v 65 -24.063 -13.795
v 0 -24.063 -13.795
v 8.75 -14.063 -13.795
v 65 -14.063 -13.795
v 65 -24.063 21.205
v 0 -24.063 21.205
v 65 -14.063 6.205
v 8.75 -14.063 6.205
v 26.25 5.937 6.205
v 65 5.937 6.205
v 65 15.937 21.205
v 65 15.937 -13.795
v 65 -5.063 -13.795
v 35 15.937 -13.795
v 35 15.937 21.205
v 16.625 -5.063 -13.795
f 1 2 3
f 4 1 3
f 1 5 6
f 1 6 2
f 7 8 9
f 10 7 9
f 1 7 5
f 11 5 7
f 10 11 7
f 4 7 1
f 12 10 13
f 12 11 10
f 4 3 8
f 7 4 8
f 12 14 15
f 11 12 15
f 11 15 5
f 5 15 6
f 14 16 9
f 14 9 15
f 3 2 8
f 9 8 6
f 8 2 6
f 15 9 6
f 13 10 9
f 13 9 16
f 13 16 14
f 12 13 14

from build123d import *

# Parameters (mm, degrees)
BOSS_EXTRU_1_DEPTH = 65
CHANFREIN1_SIZE2   = 40
CHANFREIN1_SIZE    = 35


with BuildPart() as part:
    # Esquisse1 → Boss.-Extru.1 (new body)
    with BuildSketch(Plane(origin=(0, 0, 0), x_dir=(0, 0, -1), z_dir=(1, 0, 0))):
        Polygon((-21.204724929, -24.063055062), (13.795275071, -24.063055062), (13.795275071, -14.063055062), (-6.204724929, -14.063055062), (-6.204724929, 5.936944938), (13.795275071, -5.063055062), (13.795275071, 15.936944938), (-21.204724929, 15.936944938), align=None)
    extrude(amount=BOSS_EXTRU_1_DEPTH)

    # Chanfrein1
    chanfrein1_edges = [part.edges().sort_by_distance(p)[0] for p in [
        (0, 15.936944938, 3.704724929),
    ]]
    chanfrein1_side = [part.faces().sort_by_distance(p)[0] for p in [
        (0.7, 15.936944938, 3.704724929),
    ]]
    chamfer(chanfrein1_edges, length=CHANFREIN1_SIZE - 0.0001, length2=CHANFREIN1_SIZE2 - 0.0001, reference=chanfrein1_side[0])  # a hair under: the kernel refuses the full size


solid = part.part
